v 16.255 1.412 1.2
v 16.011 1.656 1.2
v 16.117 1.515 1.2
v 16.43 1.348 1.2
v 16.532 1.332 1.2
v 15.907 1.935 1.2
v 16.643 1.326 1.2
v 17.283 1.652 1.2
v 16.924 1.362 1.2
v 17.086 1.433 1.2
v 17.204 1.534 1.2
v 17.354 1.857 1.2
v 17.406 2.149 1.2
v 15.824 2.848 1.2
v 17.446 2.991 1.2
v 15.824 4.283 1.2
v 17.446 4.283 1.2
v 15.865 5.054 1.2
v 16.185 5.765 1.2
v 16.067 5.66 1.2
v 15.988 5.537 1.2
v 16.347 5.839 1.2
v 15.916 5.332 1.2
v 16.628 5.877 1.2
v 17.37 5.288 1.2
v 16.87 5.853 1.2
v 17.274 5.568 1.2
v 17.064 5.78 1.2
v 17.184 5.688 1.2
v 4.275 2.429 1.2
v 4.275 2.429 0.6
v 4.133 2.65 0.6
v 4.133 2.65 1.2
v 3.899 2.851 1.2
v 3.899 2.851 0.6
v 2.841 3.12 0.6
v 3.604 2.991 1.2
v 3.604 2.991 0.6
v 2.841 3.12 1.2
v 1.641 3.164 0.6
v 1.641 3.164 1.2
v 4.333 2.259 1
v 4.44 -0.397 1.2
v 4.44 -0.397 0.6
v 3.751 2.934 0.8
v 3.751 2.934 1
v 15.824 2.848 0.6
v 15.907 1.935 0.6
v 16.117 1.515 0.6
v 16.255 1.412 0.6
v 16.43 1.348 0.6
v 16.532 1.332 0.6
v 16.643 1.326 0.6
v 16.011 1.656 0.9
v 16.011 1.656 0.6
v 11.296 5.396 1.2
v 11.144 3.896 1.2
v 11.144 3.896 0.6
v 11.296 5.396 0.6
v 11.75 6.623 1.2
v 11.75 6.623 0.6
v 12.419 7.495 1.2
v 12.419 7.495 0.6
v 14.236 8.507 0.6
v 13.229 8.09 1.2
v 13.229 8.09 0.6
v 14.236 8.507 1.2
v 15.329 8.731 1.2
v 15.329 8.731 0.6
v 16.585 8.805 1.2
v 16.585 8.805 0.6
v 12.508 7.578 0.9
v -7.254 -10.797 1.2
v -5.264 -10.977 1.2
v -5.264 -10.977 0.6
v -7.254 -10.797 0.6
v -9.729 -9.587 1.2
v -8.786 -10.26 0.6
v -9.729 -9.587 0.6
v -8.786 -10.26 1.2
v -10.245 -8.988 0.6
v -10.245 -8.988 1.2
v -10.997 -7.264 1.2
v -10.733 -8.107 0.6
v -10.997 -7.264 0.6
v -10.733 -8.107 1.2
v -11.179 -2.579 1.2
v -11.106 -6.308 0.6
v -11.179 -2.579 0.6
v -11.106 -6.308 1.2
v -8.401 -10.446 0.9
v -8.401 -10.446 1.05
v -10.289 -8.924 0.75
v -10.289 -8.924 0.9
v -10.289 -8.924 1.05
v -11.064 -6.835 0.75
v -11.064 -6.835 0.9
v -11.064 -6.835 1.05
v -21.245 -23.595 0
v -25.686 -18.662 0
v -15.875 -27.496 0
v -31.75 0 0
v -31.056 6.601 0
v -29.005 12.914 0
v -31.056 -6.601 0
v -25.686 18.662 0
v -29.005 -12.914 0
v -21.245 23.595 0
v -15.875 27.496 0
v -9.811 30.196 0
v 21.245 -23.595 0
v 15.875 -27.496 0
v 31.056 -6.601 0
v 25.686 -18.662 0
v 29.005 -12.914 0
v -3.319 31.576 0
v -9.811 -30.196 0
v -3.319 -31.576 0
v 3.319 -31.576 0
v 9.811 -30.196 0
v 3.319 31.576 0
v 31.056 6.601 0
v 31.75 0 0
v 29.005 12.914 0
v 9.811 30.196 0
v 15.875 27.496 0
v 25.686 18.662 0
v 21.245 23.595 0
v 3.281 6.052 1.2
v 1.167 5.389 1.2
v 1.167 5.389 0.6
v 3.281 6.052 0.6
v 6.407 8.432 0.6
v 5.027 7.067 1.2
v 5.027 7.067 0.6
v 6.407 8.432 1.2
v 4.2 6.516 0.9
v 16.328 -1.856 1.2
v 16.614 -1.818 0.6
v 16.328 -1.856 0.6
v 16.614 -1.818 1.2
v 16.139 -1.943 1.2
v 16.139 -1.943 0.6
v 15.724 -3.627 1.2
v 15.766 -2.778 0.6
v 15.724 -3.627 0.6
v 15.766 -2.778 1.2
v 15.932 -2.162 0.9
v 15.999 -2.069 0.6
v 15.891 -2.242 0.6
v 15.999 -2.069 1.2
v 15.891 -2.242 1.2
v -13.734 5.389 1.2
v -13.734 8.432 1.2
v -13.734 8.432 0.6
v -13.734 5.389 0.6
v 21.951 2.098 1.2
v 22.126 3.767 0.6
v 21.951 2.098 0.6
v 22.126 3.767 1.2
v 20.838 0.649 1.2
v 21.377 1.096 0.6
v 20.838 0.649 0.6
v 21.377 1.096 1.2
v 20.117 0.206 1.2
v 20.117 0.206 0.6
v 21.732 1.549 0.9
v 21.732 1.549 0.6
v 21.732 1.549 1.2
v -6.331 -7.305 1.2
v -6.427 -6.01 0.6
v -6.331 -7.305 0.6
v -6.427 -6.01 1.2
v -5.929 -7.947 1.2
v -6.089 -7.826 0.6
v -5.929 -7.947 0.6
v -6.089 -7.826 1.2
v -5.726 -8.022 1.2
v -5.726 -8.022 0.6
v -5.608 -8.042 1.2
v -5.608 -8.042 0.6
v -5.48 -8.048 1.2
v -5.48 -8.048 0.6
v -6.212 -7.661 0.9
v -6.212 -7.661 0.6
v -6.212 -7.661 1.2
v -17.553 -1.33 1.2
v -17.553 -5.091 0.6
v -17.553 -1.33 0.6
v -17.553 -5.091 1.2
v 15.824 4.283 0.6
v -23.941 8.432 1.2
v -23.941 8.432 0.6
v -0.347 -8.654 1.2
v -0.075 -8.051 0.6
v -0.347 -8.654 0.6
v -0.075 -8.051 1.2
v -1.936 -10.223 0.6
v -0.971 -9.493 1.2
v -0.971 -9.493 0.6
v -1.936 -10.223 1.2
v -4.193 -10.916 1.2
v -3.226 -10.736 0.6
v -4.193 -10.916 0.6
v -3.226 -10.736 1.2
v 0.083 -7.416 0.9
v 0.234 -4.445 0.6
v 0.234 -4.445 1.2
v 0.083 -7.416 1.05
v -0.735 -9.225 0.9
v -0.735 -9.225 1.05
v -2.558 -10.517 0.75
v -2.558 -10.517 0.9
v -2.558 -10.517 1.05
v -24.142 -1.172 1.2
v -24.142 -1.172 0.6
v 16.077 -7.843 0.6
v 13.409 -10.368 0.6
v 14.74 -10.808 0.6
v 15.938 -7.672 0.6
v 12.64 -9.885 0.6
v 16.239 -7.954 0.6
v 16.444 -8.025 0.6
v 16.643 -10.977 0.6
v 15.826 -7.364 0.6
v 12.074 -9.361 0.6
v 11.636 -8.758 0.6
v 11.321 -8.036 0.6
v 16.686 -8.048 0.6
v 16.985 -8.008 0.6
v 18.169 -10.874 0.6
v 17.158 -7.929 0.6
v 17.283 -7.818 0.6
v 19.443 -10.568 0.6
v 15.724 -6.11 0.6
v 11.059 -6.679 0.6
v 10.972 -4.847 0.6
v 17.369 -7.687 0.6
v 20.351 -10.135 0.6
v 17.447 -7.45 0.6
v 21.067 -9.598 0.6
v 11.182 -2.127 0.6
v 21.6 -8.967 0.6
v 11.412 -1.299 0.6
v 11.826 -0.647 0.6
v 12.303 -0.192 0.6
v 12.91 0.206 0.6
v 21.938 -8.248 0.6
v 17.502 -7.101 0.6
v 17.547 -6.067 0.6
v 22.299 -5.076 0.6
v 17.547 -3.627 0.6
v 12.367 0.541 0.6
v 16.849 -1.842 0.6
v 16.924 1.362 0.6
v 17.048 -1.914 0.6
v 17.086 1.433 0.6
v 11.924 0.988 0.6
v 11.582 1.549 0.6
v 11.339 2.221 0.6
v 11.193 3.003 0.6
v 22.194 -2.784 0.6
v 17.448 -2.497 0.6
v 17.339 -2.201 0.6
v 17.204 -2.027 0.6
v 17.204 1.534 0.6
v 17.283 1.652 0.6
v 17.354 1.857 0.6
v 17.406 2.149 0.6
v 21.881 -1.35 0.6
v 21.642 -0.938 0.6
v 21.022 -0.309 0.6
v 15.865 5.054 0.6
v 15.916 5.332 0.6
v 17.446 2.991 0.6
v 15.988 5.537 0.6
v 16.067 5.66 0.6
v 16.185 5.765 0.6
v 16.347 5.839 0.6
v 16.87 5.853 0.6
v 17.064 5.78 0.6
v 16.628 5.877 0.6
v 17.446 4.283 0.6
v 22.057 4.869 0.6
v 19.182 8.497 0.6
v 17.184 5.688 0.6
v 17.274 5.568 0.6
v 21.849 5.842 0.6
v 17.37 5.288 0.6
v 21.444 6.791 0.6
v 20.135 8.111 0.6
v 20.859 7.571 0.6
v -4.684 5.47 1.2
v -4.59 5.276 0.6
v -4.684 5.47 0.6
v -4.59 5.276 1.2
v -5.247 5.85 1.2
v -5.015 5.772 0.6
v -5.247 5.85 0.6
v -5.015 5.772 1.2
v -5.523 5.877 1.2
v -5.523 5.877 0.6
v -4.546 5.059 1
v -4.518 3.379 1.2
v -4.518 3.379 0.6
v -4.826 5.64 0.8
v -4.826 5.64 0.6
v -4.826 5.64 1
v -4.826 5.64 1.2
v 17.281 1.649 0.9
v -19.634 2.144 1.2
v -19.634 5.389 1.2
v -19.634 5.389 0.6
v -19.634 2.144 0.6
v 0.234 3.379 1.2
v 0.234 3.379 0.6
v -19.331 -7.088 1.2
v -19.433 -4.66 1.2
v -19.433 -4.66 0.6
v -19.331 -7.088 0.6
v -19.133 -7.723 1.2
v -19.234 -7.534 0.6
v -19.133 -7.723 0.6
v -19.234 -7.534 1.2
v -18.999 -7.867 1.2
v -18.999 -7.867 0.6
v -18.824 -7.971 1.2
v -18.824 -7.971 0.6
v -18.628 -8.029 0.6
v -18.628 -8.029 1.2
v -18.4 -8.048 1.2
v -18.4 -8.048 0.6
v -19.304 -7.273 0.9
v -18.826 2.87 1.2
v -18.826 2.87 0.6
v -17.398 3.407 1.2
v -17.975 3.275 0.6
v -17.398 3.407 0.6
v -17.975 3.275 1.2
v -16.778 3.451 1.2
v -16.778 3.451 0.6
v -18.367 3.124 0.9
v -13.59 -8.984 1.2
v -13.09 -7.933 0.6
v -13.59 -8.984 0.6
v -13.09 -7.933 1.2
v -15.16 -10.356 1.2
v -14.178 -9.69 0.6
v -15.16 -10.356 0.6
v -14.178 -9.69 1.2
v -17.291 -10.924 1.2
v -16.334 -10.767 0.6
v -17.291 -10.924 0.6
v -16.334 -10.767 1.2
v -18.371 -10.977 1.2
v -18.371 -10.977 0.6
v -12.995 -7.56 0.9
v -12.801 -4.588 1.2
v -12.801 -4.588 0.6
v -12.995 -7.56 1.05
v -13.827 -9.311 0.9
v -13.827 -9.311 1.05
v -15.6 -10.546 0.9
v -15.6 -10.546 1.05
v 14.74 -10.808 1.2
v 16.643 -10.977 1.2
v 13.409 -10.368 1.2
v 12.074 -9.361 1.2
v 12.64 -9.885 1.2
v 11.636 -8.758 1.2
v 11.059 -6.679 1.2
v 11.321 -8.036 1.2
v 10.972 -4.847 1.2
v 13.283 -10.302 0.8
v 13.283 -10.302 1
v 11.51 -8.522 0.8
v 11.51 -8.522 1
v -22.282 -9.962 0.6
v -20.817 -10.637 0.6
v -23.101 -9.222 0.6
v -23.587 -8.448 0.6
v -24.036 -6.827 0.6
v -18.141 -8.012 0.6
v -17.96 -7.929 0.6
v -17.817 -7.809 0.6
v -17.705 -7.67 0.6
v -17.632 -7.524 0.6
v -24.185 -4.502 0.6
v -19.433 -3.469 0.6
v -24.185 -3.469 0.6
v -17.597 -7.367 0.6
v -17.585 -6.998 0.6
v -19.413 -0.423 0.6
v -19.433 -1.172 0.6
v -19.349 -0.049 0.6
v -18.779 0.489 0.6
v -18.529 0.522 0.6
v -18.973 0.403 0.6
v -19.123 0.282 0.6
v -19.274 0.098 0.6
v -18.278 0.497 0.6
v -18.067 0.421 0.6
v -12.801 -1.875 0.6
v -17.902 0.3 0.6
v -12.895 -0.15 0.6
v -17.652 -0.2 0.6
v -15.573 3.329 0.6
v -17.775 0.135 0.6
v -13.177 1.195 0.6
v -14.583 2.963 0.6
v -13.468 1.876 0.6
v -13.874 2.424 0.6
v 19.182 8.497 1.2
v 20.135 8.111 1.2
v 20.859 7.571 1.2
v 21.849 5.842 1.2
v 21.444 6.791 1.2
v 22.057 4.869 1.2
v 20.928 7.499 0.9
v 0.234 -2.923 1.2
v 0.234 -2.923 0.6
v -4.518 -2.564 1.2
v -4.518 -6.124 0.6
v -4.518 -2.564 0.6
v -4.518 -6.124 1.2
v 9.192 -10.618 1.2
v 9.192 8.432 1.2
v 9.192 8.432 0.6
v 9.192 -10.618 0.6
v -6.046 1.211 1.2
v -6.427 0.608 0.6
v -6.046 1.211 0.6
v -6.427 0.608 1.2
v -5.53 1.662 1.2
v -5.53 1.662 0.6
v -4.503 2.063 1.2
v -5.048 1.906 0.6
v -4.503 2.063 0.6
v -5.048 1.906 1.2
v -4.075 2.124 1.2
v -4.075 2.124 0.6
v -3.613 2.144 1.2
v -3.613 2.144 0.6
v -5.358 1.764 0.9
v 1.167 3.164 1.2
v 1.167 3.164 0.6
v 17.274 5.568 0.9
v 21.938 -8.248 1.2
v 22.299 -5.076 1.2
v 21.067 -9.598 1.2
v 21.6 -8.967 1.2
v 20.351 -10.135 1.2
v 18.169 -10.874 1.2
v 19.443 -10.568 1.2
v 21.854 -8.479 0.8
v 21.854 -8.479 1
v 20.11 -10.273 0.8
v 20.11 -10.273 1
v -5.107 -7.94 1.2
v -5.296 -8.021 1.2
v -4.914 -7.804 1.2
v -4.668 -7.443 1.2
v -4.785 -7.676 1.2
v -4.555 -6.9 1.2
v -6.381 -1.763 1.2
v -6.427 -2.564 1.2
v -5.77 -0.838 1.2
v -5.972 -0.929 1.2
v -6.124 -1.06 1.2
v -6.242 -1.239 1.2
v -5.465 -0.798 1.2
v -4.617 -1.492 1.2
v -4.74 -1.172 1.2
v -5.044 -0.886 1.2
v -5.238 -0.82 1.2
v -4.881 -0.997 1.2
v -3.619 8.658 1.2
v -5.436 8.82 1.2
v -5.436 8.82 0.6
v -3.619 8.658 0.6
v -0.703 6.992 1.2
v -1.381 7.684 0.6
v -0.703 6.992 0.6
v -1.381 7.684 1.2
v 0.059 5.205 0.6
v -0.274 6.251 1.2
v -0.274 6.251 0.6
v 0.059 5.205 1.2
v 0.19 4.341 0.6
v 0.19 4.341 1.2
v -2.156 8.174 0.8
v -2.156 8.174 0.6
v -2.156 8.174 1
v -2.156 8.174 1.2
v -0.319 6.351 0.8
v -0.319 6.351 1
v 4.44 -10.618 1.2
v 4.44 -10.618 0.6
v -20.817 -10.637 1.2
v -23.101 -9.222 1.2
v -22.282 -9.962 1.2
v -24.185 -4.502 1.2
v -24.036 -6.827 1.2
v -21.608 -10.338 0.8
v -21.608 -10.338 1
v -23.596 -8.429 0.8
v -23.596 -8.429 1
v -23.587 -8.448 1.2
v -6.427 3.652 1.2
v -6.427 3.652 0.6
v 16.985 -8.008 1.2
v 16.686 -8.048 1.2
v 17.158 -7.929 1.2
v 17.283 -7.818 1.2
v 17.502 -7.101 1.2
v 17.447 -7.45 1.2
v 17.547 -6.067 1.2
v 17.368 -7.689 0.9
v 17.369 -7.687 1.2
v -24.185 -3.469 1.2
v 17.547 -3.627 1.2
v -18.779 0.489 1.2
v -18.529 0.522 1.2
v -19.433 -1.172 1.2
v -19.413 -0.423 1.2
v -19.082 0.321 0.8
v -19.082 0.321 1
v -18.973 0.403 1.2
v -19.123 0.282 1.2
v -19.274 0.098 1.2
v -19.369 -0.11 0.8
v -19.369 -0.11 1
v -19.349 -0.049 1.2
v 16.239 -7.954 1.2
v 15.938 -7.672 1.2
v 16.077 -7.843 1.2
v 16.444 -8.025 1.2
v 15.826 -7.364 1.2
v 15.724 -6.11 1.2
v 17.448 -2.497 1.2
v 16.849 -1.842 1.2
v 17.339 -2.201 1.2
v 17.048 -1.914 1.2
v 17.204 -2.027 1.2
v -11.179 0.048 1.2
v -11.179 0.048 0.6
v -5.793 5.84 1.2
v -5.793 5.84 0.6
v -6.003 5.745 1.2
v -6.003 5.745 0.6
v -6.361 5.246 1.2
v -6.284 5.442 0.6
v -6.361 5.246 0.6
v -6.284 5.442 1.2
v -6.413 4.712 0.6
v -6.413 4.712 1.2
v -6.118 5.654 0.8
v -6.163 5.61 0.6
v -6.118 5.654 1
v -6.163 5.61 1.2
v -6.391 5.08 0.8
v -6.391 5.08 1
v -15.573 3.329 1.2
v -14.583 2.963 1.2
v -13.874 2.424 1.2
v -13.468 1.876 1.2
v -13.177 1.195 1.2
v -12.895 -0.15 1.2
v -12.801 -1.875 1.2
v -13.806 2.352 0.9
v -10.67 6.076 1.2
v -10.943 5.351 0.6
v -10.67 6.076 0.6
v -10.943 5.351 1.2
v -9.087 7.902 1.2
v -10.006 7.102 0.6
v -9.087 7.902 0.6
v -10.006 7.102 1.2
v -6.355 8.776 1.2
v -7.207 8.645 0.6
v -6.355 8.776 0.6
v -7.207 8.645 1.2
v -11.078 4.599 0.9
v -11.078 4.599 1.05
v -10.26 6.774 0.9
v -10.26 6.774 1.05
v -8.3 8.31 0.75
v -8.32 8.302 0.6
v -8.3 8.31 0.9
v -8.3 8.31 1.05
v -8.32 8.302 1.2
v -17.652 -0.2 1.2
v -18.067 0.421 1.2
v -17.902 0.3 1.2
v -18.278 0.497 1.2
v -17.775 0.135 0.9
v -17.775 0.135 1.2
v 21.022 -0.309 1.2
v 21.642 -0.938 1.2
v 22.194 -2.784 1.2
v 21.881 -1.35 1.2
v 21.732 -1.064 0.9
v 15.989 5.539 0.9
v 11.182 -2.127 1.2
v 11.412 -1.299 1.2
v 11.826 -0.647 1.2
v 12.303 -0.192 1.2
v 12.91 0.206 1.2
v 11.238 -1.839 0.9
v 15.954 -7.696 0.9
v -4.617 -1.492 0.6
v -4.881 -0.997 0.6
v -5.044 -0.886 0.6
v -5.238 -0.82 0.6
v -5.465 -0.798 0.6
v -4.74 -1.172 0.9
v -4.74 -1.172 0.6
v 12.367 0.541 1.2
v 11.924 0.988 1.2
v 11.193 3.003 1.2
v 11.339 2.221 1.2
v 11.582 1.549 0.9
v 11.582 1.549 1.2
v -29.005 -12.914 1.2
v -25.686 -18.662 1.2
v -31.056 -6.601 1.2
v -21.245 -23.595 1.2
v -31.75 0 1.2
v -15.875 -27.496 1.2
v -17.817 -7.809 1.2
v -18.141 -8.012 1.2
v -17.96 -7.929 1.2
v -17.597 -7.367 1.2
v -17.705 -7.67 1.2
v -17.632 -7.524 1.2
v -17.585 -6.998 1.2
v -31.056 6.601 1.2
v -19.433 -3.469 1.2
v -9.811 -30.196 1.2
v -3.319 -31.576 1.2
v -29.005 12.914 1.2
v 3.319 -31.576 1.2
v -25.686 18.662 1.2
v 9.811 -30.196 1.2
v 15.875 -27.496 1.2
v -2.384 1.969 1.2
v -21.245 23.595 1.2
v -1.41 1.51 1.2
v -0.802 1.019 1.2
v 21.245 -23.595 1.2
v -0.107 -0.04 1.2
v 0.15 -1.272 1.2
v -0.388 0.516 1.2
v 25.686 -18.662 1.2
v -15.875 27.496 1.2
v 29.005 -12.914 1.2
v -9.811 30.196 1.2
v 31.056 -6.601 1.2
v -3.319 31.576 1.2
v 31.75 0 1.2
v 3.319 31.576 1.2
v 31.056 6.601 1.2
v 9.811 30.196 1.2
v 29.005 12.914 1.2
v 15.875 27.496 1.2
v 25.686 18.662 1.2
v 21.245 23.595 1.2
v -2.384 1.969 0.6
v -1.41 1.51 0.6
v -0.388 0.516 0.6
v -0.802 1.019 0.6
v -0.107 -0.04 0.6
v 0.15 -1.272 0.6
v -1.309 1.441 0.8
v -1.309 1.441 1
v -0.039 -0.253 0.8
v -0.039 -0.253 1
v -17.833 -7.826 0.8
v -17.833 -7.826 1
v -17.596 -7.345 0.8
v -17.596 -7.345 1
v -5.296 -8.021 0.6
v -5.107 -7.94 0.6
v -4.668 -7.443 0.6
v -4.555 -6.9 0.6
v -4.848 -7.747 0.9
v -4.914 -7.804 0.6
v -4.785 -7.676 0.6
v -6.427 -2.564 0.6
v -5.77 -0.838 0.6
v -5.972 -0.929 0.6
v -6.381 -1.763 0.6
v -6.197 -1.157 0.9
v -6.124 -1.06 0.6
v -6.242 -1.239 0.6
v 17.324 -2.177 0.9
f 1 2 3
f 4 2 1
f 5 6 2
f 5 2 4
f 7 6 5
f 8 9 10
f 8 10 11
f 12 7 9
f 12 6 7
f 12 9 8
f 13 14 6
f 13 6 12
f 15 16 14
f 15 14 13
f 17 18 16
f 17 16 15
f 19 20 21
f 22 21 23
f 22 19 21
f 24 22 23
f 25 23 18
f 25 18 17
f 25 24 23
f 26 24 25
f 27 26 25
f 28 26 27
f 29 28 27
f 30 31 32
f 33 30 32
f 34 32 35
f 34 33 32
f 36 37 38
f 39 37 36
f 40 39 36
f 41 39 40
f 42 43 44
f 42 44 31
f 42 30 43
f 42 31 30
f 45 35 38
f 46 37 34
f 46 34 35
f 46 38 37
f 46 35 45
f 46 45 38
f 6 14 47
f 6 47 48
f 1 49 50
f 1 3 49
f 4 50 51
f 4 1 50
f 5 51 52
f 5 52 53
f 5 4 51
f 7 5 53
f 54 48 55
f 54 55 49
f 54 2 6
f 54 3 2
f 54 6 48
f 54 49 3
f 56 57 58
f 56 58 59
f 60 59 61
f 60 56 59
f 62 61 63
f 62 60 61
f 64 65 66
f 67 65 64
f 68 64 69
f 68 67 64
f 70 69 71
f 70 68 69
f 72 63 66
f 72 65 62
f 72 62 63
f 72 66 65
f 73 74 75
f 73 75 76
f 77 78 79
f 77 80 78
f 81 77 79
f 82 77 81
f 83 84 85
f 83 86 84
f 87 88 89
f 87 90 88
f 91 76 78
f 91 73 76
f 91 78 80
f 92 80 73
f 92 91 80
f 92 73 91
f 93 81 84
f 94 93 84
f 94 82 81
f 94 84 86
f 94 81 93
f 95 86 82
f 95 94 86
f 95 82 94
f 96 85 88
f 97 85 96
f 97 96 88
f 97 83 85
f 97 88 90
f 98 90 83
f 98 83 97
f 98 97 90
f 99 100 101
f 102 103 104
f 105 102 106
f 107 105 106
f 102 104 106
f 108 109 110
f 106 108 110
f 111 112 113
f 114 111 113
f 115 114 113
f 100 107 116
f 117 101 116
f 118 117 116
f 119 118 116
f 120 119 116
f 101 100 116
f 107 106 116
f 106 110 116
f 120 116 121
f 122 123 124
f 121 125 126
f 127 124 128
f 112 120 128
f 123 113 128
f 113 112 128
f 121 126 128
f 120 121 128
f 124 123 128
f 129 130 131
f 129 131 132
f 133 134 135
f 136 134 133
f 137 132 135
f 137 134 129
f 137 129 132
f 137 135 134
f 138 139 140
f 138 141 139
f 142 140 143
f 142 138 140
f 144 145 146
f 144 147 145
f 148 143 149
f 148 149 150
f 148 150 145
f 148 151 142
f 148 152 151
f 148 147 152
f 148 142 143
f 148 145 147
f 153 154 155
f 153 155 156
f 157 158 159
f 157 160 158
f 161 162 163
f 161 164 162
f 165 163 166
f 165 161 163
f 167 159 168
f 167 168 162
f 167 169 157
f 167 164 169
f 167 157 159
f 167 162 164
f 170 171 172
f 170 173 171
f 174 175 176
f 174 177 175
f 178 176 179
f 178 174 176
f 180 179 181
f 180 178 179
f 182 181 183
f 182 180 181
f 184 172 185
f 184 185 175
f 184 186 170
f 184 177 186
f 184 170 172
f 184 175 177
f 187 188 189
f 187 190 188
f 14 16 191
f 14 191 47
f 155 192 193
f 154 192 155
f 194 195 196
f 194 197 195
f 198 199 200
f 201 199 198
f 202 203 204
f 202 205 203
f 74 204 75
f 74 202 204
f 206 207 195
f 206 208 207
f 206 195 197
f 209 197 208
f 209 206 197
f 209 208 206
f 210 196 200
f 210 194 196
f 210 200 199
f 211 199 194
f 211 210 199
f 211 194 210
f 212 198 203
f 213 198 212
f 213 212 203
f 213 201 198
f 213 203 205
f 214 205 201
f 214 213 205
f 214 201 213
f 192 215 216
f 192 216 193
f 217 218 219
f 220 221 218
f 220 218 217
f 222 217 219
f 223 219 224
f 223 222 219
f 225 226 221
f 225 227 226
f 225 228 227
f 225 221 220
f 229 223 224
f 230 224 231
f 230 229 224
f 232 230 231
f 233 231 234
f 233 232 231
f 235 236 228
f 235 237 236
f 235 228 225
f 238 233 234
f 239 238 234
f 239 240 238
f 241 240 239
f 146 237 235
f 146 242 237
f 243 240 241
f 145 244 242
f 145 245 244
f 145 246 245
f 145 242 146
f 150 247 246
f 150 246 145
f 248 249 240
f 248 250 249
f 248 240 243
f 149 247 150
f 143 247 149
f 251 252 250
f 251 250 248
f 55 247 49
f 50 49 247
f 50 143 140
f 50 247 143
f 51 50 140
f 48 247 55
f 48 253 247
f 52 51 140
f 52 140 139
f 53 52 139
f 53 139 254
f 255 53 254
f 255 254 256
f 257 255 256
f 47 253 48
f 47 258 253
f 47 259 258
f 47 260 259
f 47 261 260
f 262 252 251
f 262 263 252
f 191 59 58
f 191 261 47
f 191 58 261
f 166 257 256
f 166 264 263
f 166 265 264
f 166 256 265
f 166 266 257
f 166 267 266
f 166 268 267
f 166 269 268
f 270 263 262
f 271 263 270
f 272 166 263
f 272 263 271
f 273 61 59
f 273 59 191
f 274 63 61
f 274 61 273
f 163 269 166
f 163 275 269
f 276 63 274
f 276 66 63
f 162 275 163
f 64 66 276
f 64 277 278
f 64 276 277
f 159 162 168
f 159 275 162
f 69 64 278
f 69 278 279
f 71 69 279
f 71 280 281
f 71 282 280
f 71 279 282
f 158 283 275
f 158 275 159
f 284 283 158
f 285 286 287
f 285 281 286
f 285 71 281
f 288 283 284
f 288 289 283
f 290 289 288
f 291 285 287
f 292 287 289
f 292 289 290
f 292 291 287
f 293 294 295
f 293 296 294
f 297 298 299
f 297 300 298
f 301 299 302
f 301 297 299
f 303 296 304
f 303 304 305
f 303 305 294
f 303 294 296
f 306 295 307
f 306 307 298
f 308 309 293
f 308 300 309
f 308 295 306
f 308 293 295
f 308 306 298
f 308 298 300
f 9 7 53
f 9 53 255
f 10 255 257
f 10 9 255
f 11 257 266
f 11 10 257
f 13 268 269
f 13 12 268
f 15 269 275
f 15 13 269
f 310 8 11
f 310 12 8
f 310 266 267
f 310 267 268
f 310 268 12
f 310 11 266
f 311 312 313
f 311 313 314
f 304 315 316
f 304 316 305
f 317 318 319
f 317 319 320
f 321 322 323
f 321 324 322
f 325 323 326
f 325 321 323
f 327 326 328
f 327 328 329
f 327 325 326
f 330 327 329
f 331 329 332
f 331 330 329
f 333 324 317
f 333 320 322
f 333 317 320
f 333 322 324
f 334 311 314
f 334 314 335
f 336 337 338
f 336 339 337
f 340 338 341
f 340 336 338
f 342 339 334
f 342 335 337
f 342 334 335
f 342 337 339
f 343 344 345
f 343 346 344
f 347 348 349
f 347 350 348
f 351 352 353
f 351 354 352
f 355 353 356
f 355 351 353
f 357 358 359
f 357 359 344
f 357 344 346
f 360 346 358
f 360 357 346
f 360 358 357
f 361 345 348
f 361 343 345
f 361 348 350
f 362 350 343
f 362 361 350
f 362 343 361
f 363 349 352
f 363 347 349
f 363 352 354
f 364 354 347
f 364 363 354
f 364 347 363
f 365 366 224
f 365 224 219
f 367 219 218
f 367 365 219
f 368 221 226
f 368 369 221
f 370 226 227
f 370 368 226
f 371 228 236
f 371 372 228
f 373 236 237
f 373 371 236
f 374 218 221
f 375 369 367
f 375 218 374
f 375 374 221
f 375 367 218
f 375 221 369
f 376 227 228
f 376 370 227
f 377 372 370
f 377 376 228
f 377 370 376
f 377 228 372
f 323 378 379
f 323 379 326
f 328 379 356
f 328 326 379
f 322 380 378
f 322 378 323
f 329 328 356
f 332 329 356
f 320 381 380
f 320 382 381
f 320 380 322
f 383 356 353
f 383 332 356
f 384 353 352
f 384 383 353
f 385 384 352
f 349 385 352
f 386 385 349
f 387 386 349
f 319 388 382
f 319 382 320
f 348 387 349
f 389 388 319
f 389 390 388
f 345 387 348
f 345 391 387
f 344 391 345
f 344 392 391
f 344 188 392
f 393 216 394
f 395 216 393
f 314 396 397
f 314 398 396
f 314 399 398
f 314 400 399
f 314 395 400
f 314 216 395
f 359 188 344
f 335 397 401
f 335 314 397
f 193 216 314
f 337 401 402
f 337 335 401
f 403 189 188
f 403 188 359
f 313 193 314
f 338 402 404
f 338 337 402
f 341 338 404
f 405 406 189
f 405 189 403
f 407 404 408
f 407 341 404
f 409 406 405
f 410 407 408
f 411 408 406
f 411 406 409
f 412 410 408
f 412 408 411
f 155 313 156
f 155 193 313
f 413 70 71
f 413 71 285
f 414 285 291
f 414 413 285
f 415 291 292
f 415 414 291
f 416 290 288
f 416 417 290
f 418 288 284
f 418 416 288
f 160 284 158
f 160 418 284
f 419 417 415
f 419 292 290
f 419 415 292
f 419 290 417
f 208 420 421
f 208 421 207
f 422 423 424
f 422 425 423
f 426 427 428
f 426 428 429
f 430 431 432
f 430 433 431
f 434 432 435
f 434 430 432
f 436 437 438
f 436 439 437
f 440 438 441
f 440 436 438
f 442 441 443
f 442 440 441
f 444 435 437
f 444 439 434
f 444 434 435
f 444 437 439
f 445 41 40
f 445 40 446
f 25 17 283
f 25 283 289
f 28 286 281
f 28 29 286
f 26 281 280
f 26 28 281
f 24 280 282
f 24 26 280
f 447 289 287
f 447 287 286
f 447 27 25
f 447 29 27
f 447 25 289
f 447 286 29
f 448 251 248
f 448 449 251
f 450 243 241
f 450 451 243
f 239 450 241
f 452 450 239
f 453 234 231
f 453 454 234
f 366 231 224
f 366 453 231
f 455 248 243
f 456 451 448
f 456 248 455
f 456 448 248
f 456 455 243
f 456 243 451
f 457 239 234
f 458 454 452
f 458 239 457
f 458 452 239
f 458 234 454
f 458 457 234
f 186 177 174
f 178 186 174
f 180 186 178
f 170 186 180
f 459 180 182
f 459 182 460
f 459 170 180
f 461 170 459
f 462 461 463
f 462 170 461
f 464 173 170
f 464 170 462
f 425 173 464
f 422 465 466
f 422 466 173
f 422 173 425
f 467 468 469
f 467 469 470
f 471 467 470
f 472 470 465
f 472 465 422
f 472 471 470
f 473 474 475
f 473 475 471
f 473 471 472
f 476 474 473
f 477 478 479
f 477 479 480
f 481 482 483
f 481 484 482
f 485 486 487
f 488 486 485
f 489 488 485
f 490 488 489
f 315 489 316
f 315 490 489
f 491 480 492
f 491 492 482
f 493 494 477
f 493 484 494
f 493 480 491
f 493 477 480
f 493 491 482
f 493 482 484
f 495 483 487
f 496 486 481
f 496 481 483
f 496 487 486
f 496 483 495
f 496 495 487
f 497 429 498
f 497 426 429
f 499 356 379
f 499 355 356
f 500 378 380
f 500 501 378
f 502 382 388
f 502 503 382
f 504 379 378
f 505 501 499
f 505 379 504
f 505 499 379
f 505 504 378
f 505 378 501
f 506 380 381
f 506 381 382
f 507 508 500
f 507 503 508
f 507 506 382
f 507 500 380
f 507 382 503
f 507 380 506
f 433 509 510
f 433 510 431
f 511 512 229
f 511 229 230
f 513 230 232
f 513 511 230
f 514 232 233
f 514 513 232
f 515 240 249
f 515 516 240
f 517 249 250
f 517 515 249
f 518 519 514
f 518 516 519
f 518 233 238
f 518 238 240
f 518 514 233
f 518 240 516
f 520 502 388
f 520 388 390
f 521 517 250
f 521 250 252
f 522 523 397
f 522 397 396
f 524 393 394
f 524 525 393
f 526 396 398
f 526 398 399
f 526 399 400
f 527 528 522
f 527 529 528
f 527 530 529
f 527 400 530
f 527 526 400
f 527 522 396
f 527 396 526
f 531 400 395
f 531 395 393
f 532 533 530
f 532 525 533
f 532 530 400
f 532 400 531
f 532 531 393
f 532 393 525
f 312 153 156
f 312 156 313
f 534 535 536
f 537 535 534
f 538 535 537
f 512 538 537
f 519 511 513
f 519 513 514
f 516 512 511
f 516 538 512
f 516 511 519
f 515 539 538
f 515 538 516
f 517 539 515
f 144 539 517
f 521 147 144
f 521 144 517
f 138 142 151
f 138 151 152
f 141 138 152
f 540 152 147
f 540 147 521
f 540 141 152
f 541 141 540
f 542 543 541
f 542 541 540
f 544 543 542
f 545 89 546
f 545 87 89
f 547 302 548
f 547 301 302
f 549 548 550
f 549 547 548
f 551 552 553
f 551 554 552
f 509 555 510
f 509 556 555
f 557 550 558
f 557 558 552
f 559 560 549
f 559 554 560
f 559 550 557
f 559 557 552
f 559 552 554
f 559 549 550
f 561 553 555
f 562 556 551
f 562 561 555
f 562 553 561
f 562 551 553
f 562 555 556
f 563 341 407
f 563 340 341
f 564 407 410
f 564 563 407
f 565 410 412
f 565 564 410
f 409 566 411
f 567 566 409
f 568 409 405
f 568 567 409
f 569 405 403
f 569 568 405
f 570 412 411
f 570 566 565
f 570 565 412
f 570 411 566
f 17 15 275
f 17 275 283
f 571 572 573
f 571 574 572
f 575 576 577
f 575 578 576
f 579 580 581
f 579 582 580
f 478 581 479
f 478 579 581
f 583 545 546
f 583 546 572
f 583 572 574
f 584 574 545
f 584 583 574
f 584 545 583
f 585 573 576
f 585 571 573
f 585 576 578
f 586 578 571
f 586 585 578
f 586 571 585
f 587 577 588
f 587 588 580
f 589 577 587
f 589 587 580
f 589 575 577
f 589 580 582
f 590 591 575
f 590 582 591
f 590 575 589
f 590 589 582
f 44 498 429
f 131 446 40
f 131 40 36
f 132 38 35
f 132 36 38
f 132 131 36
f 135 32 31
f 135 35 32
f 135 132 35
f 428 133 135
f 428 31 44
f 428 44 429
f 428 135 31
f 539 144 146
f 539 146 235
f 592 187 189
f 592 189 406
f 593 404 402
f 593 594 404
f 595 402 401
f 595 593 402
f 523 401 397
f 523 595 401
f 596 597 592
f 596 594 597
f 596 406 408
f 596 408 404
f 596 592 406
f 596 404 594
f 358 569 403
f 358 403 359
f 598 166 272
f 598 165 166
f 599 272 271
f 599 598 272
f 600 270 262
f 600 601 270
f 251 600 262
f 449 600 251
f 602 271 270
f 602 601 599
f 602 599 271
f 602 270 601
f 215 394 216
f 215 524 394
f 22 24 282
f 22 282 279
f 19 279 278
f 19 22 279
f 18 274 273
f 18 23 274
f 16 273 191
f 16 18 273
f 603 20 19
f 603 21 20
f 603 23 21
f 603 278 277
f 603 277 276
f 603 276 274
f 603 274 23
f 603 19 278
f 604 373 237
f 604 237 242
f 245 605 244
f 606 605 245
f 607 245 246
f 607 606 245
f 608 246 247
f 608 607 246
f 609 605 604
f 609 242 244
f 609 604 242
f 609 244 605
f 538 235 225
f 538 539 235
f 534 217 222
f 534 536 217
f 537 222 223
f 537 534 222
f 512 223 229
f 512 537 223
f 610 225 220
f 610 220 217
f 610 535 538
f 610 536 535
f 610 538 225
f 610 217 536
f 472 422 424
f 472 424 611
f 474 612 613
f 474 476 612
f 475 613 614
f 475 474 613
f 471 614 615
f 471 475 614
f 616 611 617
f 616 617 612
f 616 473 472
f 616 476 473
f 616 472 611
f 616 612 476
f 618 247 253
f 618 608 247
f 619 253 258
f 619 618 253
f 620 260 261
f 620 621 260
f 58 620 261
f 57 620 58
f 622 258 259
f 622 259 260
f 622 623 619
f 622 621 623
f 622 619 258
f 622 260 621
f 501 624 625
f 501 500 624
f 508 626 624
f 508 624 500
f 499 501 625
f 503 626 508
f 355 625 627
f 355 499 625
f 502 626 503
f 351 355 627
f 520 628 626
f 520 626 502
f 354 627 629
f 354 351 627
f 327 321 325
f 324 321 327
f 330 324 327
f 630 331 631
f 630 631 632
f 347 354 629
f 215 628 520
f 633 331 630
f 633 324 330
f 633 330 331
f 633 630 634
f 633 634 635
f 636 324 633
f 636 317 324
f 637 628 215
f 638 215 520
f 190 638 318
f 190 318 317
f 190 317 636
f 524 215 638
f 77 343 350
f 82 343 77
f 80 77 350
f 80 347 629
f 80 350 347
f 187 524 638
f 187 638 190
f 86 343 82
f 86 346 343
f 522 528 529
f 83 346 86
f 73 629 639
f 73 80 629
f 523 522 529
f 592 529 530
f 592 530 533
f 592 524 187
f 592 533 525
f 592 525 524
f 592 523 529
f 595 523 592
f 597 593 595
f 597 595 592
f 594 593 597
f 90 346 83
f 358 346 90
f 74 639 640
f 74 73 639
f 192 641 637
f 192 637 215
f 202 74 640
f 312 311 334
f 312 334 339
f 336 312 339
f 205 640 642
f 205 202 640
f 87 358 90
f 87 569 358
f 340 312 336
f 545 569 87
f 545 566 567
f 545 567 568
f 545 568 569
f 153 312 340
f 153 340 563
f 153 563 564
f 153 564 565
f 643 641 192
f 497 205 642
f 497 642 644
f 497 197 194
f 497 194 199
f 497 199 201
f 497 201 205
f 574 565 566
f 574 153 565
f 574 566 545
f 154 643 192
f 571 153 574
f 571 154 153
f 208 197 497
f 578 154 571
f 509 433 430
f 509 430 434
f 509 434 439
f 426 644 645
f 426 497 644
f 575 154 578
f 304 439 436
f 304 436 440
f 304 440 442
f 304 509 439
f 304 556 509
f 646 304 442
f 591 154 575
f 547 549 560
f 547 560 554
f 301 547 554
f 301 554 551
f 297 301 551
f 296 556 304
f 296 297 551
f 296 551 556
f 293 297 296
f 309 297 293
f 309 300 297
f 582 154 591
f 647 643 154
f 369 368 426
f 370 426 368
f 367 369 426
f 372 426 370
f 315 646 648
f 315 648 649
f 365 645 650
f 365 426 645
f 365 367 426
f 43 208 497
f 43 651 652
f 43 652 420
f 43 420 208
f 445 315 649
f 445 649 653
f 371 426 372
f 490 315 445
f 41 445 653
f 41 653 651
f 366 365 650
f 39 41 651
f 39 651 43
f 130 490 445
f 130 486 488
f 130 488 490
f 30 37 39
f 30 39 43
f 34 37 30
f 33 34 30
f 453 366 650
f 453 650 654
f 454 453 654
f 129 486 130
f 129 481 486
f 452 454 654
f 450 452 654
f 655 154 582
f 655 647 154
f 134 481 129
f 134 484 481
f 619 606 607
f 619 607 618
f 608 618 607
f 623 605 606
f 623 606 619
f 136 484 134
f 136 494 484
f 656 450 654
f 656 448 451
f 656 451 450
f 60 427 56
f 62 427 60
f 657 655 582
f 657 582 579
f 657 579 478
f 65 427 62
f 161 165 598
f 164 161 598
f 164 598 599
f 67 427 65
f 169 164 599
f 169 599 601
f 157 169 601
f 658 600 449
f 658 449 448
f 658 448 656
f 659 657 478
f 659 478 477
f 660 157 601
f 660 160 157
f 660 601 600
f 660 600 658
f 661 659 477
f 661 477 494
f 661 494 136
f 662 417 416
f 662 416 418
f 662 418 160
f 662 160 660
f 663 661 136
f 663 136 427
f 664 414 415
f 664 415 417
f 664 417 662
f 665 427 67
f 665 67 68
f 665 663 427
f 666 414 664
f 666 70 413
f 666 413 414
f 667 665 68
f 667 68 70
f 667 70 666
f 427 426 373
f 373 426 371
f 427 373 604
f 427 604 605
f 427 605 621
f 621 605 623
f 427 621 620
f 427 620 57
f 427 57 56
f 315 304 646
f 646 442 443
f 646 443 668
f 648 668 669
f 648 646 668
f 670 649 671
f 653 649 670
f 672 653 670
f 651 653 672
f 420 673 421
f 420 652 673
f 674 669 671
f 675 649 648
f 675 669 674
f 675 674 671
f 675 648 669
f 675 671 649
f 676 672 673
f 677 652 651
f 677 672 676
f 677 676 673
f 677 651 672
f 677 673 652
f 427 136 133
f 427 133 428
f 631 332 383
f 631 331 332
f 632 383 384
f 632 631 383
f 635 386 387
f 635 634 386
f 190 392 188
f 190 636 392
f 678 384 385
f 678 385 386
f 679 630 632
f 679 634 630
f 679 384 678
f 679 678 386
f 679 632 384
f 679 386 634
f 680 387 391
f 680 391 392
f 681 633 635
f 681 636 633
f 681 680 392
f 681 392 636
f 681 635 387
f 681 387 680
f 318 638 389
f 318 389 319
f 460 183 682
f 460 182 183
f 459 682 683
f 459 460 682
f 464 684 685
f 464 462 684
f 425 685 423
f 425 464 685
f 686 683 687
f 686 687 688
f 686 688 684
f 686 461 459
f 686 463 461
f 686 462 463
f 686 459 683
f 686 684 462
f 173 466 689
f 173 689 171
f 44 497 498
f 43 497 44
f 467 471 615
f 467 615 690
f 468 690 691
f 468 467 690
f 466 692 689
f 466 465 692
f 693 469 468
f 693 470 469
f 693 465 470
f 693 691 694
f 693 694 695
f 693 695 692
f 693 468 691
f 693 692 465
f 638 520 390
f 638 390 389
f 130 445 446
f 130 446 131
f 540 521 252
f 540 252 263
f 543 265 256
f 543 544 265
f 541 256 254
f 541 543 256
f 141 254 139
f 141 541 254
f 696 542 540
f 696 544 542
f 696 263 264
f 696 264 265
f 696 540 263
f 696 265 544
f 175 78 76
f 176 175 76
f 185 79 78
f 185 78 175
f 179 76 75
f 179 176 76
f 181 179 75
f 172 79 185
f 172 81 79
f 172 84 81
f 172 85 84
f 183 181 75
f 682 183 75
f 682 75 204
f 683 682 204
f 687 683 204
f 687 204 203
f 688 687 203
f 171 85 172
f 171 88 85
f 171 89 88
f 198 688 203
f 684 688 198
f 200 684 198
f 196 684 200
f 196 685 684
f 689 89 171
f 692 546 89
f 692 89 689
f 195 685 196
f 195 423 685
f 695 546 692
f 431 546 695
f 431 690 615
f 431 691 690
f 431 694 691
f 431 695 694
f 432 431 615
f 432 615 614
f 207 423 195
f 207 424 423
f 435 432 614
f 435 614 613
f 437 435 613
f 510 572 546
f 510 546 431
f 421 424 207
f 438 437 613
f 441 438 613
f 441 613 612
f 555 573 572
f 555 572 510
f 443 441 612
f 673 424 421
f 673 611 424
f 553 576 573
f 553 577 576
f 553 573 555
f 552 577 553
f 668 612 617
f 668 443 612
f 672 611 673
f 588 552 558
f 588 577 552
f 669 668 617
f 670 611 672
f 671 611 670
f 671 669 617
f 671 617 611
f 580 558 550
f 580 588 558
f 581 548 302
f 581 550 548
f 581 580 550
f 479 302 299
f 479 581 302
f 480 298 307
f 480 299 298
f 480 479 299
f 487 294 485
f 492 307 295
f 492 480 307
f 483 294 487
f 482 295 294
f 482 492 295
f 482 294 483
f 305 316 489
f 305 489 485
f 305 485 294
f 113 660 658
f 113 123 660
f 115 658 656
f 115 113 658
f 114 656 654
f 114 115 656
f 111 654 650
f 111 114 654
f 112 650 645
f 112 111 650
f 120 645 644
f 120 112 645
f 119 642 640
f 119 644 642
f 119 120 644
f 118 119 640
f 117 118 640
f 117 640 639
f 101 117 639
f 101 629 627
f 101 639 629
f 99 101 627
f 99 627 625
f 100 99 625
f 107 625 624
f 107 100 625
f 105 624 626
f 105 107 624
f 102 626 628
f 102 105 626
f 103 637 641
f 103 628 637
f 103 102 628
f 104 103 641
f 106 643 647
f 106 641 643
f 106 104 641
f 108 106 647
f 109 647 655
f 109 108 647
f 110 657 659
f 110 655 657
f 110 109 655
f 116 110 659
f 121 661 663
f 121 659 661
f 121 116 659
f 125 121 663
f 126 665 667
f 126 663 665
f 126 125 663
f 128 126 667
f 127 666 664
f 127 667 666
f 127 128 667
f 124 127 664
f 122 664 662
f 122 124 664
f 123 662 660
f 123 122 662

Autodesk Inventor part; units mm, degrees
ref_plane "YZ Plane" through (0, 0, 0) normal (1, 0, 0) x (0, 1, 0)
ref_plane "XZ Plane" through (0, 0, 0) normal (0, 1, 0) x (-1, 0, 0)
ref_plane "XY Plane" through (0, 0, 0) normal (0, 0, 1) x (1, 0, 0)
sketch "Sketch1" plane through (0, 0, 0) normal (0, 0, 1) x (1, 0, 0)
  circle A0 centre (0, 0) radius 31.75
  line L0 (-24.9602, 8.8198) -> (23.1368, 8.8198) construction
  line L1 (23.1368, 8.8198) -> (23.1368, -14.9885) construction
  line L2 (23.1368, -14.9885) -> (-24.9602, -14.9885) construction
  line L3 (-24.9602, -14.9885) -> (-24.9602, 8.8198) construction
  line L4 (-13.7341, 8.4322) -> (-13.7341, 5.3888)
  line L5 (-13.7341, 5.3888) -> (-19.6343, 5.3888)
  line L6 (-19.6343, 5.3888) -> (-19.6343, 2.1444)
  spline S0 degree 2 poles (-19.6343, 2.1444) (-18.5289, 3.4507) (-16.7775, 3.4507) knots 0 0 0 1 1 1
  spline S1 degree 2 poles (-16.7775, 3.4507) (-14.8107, 3.4507) (-12.8009, 1.2543) (-12.8009, -1.8752) knots 0 0 0 1 2 2 2
  line L7 (-12.8009, -1.8752) -> (-12.8009, -4.5884)
  spline S2 degree 2 poles (-12.8009, -4.5884) (-12.8009, -6.6126) (-13.1886, -8.5076) (-14.4662, -10.1154) (-16.7344, -10.9767) (-18.371, -10.9767) knots 0 0 0 1 2 3 4 4 4
  spline S3 degree 2 poles (-18.371, -10.9767) (-20.2085, -10.9767) (-23.0078, -9.6991) (-24.185, -7.1581) (-24.185, -4.5023) knots 0 0 0 1 2 3 3 3
  line L8 (-24.185, -4.5023) -> (-24.185, -3.4687)
  line L9 (-24.185, -3.4687) -> (-19.4333, -3.4687)
  line L10 (-19.4333, -3.4687) -> (-19.4333, -4.6602)
  spline S4 degree 2 poles (-19.4333, -4.6602) (-19.4333, -6.4978) (-19.1749, -8.0482) (-18.3997, -8.0482) knots 0 0 0 1 2 2 2
  spline S5 degree 2 poles (-18.3997, -8.0482) (-18.0551, -8.0482) (-17.6101, -7.6031) (-17.5814, -7.0863) (-17.5527, -5.0909) knots 0 0 0 1 2 3 3 3
  line L11 (-17.5527, -5.0909) -> (-17.5527, -1.3297)
  spline S6 degree 2 poles (-17.5527, -1.3297) (-17.5527, -0.253) (-17.9977, 0.5222) (-18.5289, 0.5222) knots 0 0 0 1 2 2 2
  spline S7 degree 2 poles (-18.5289, 0.5222) (-18.859, 0.5222) (-19.3041, 0.1202) (-19.4333, -0.3392) (-19.4333, -1.1718) knots 0 0 0 1 2 3 3 3
  line L12 (-19.4333, -1.1718) -> (-24.1419, -1.1718)
  line L13 (-24.1419, -1.1718) -> (-23.941, 8.4322)
  line L14 (-23.941, 8.4322) -> (-13.7341, 8.4322)
  line L15 (0.234, 3.379) -> (-4.5177, 3.379)
  spline S8 degree 2 poles (-4.5177, 3.379) (-4.5177, 4.714) (-4.5751, 5.4031) (-5.0776, 5.8768) (-5.5226, 5.8768) knots 0 0 0 1 2 3 3 3
  spline S9 degree 2 poles (-5.5226, 5.8768) (-5.8815, 5.8768) (-6.3552, 5.4318) (-6.427, 4.7284) (-6.427, 3.6517) knots 0 0 0 1 2 3 3 3
  line L16 (-6.427, 3.6517) -> (-6.427, 0.6083)
  spline S10 degree 2 poles (-6.427, 0.6083) (-6.0681, 1.3835) (-4.6469, 2.1444) (-3.6133, 2.1444) knots 0 0 0 1 2 2 2
  spline S11 degree 2 poles (-3.6133, 2.1444) (-2.3069, 2.1444) (-0.3115, 0.7375) (0.234, -1.2436) (0.234, -2.9232) knots 0 0 0 1 2 3 3 3
  line L17 (0.234, -2.9232) -> (0.234, -4.4449)
  spline S12 degree 2 poles (0.234, -4.4449) (0.234, -6.4403) (-0.0675, -8.3927) (-1.4025, -10.058) (-3.7138, -10.9767) (-5.2642, -10.9767) knots 0 0 0 1 2 3 4 4 4
  spline S13 degree 2 poles (-5.2642, -10.9767) (-7.1735, -10.9767) (-9.6283, -9.9144) (-10.9491, -7.9333) (-11.1788, -5.7369) (-11.1788, -2.5787) knots 0 0 0 1 2 3 4 4 4
  line L18 (-11.1788, -2.5787) -> (-11.1788, 0.0484)
  spline S14 degree 2 poles (-11.1788, 0.0484) (-11.1788, 3.4507) (-10.9778, 5.7476) (-9.5422, 7.8005) (-7.0587, 8.8198) (-5.4365, 8.8198) knots 0 0 0 1 2 3 4 4 4
  spline S15 degree 2 poles (-5.4365, 8.8198) (-3.441, 8.8198) (-0.8714, 7.5278) (0.234, 5.1734) (0.234, 3.379) knots 0 0 0 1 2 3 3 3
  spline S16 degree 2 poles (-4.5177, -2.5643) (-4.5177, -1.545) (-4.9627, -0.7985) (-5.4652, -0.7985) knots 0 0 0 1 2 2 2
  spline S17 degree 2 poles (-5.4652, -0.7985) (-5.9676, -0.7985) (-6.427, -1.5163) (-6.427, -2.5643) knots 0 0 0 1 2 2 2
  line L19 (-6.427, -2.5643) -> (-6.427, -6.0097)
  spline S18 degree 2 poles (-6.427, -6.0097) (-6.427, -7.273) (-5.9964, -8.0482) (-5.4795, -8.0482) knots 0 0 0 1 2 2 2
  spline S19 degree 2 poles (-5.4795, -8.0482) (-5.1781, -8.0482) (-4.5177, -7.4452) (-4.5177, -6.1245) knots 0 0 0 1 2 2 2
  line L20 (-4.5177, -6.1245) -> (-4.5177, -2.5643)
  line L21 (9.192, 8.4322) -> (9.192, -10.6178)
  line L22 (9.192, -10.6178) -> (4.4402, -10.6178)
  line L23 (4.4402, -10.6178) -> (4.4402, -0.3966)
  spline S20 degree 2 poles (4.4402, -0.3966) (4.4402, 1.8142) (4.2249, 2.7042) (3.2774, 3.1636) (1.6409, 3.1636) knots 0 0 0 1 2 3 3 3
  line L24 (1.6409, 3.1636) -> (1.1671, 3.1636)
  line L25 (1.1671, 3.1636) -> (1.1671, 5.3888)
  spline S21 degree 2 poles (1.1671, 5.3888) (4.6125, 6.1209) (6.407, 8.4322) knots 0 0 0 1 1 1
  line L26 (6.407, 8.4322) -> (9.192, 8.4322)
  spline S22 degree 2 poles (20.1166, 0.2064) (21.1646, -0.2243) (22.2987, -1.9039) (22.2987, -5.0765) knots 0 0 0 1 2 2 2
  spline S23 degree 2 poles (22.2987, -5.0765) (22.2987, -7.3878) (21.4087, -9.5699) (18.8103, -10.9767) (16.6426, -10.9767) knots 0 0 0 1 2 3 3 3
  spline S24 degree 2 poles (16.6426, -10.9767) (14.5179, -10.9767) (12.0487, -9.6273) (10.9721, -7.4165) (10.9721, -4.8469) knots 0 0 0 1 2 3 3 3
  spline S25 degree 2 poles (10.9721, -4.8469) (10.9721, -3.1098) (11.5032, -0.5689) (12.9101, 0.2064) knots 0 0 0 1 2 2 2
  spline S26 degree 2 poles (12.9101, 0.2064) (12.02, 0.6227) (11.1443, 2.4746) (11.1443, 3.8958) knots 0 0 0 1 2 2 2
  spline S27 degree 2 poles (11.1443, 3.8958) (11.1443, 6.3506) (13.8719, 8.8054) (16.5851, 8.8054) knots 0 0 0 1 2 2 2
  spline S28 degree 2 poles (16.5851, 8.8054) (19.729, 8.8054) (22.1264, 6.1927) (22.1264, 3.7666) knots 0 0 0 1 2 2 2
  spline S29 degree 2 poles (22.1264, 3.7666) (22.1264, 2.2305) (21.3369, 0.8667) (20.1166, 0.2064) knots 0 0 0 1 2 2 2
  spline S30 degree 2 poles (17.547, -3.6266) (17.547, -2.5356) (17.102, -1.8178) (16.6139, -1.8178) knots 0 0 0 1 2 2 2
  spline S31 degree 2 poles (16.6139, -1.8178) (16.1401, -1.8178) (15.7238, -2.5069) (15.7238, -3.6266) knots 0 0 0 1 2 2 2
  line L27 (15.7238, -3.6266) -> (15.7238, -6.1102)
  spline S32 degree 2 poles (15.7238, -6.1102) (15.7238, -7.3447) (16.1832, -8.0482) (16.6856, -8.0482) knots 0 0 0 1 2 2 2
  spline S33 degree 2 poles (16.6856, -8.0482) (17.1881, -8.0482) (17.547, -7.3304) (17.547, -6.0671) knots 0 0 0 1 2 2 2
  line L28 (17.547, -6.0671) -> (17.547, -3.6266)
  spline S34 degree 2 poles (17.4465, 4.2834) (17.4465, 5.2596) (17.102, 5.8768) (16.6282, 5.8768) knots 0 0 0 1 2 2 2
  spline S35 degree 2 poles (16.6282, 5.8768) (16.1545, 5.8768) (15.8243, 5.2021) (15.8243, 4.2834) knots 0 0 0 1 2 2 2
  line L29 (15.8243, 4.2834) -> (15.8243, 2.8478)
  spline S36 degree 2 poles (15.8243, 2.8478) (15.8243, 1.9865) (16.1975, 1.3261) (16.6426, 1.3261) knots 0 0 0 1 2 2 2
  spline S37 degree 2 poles (16.6426, 1.3261) (17.1163, 1.3261) (17.4465, 1.9721) (17.4465, 2.9914) knots 0 0 0 1 2 2 2
  line L30 (17.4465, 2.9914) -> (17.4465, 4.2834)
  dimension "d0" = 63.5
extrude "Extrusion1" add sketch "Sketch1" along normal blind 1.2 contours A0 | L4 L5 L6 S0 S1 L7 S2 S3 L8 L9 L10 S4 S5 L11 S6 S7 L12 L13 L14 | L15 S8 S9 L16 S10 S11 L17 S12 S13 L18 S14 S15 | L20 S19 S18 L19 S17 S16 | L21 L22 L23 S20 L24 L25 S21 L26 | S22 S23 S24 S25 S26 S27 S28 S29 | L28 S33 S32 L27 S31 S30 | L30 S37 S36 L29 S35 S34
extrude "Extrusion2" cut sketch "Sketch1" against normal blind 0.6 from surface at 1.2 contours L4 L5 L6 S0 S1 L7 S2 S3 L8 L9 L10 S4 S5 L11 S6 S7 L12 L13 L14 | L15 S8 S9 L16 S10 S11 L17 S12 S13 L18 S14 S15 | L21 L22 L23 S20 L24 L25 S21 L26 | S22 S23 S24 S25 S26 S27 S28 S29
properties part number "Blue Alliance Marker 5618"
